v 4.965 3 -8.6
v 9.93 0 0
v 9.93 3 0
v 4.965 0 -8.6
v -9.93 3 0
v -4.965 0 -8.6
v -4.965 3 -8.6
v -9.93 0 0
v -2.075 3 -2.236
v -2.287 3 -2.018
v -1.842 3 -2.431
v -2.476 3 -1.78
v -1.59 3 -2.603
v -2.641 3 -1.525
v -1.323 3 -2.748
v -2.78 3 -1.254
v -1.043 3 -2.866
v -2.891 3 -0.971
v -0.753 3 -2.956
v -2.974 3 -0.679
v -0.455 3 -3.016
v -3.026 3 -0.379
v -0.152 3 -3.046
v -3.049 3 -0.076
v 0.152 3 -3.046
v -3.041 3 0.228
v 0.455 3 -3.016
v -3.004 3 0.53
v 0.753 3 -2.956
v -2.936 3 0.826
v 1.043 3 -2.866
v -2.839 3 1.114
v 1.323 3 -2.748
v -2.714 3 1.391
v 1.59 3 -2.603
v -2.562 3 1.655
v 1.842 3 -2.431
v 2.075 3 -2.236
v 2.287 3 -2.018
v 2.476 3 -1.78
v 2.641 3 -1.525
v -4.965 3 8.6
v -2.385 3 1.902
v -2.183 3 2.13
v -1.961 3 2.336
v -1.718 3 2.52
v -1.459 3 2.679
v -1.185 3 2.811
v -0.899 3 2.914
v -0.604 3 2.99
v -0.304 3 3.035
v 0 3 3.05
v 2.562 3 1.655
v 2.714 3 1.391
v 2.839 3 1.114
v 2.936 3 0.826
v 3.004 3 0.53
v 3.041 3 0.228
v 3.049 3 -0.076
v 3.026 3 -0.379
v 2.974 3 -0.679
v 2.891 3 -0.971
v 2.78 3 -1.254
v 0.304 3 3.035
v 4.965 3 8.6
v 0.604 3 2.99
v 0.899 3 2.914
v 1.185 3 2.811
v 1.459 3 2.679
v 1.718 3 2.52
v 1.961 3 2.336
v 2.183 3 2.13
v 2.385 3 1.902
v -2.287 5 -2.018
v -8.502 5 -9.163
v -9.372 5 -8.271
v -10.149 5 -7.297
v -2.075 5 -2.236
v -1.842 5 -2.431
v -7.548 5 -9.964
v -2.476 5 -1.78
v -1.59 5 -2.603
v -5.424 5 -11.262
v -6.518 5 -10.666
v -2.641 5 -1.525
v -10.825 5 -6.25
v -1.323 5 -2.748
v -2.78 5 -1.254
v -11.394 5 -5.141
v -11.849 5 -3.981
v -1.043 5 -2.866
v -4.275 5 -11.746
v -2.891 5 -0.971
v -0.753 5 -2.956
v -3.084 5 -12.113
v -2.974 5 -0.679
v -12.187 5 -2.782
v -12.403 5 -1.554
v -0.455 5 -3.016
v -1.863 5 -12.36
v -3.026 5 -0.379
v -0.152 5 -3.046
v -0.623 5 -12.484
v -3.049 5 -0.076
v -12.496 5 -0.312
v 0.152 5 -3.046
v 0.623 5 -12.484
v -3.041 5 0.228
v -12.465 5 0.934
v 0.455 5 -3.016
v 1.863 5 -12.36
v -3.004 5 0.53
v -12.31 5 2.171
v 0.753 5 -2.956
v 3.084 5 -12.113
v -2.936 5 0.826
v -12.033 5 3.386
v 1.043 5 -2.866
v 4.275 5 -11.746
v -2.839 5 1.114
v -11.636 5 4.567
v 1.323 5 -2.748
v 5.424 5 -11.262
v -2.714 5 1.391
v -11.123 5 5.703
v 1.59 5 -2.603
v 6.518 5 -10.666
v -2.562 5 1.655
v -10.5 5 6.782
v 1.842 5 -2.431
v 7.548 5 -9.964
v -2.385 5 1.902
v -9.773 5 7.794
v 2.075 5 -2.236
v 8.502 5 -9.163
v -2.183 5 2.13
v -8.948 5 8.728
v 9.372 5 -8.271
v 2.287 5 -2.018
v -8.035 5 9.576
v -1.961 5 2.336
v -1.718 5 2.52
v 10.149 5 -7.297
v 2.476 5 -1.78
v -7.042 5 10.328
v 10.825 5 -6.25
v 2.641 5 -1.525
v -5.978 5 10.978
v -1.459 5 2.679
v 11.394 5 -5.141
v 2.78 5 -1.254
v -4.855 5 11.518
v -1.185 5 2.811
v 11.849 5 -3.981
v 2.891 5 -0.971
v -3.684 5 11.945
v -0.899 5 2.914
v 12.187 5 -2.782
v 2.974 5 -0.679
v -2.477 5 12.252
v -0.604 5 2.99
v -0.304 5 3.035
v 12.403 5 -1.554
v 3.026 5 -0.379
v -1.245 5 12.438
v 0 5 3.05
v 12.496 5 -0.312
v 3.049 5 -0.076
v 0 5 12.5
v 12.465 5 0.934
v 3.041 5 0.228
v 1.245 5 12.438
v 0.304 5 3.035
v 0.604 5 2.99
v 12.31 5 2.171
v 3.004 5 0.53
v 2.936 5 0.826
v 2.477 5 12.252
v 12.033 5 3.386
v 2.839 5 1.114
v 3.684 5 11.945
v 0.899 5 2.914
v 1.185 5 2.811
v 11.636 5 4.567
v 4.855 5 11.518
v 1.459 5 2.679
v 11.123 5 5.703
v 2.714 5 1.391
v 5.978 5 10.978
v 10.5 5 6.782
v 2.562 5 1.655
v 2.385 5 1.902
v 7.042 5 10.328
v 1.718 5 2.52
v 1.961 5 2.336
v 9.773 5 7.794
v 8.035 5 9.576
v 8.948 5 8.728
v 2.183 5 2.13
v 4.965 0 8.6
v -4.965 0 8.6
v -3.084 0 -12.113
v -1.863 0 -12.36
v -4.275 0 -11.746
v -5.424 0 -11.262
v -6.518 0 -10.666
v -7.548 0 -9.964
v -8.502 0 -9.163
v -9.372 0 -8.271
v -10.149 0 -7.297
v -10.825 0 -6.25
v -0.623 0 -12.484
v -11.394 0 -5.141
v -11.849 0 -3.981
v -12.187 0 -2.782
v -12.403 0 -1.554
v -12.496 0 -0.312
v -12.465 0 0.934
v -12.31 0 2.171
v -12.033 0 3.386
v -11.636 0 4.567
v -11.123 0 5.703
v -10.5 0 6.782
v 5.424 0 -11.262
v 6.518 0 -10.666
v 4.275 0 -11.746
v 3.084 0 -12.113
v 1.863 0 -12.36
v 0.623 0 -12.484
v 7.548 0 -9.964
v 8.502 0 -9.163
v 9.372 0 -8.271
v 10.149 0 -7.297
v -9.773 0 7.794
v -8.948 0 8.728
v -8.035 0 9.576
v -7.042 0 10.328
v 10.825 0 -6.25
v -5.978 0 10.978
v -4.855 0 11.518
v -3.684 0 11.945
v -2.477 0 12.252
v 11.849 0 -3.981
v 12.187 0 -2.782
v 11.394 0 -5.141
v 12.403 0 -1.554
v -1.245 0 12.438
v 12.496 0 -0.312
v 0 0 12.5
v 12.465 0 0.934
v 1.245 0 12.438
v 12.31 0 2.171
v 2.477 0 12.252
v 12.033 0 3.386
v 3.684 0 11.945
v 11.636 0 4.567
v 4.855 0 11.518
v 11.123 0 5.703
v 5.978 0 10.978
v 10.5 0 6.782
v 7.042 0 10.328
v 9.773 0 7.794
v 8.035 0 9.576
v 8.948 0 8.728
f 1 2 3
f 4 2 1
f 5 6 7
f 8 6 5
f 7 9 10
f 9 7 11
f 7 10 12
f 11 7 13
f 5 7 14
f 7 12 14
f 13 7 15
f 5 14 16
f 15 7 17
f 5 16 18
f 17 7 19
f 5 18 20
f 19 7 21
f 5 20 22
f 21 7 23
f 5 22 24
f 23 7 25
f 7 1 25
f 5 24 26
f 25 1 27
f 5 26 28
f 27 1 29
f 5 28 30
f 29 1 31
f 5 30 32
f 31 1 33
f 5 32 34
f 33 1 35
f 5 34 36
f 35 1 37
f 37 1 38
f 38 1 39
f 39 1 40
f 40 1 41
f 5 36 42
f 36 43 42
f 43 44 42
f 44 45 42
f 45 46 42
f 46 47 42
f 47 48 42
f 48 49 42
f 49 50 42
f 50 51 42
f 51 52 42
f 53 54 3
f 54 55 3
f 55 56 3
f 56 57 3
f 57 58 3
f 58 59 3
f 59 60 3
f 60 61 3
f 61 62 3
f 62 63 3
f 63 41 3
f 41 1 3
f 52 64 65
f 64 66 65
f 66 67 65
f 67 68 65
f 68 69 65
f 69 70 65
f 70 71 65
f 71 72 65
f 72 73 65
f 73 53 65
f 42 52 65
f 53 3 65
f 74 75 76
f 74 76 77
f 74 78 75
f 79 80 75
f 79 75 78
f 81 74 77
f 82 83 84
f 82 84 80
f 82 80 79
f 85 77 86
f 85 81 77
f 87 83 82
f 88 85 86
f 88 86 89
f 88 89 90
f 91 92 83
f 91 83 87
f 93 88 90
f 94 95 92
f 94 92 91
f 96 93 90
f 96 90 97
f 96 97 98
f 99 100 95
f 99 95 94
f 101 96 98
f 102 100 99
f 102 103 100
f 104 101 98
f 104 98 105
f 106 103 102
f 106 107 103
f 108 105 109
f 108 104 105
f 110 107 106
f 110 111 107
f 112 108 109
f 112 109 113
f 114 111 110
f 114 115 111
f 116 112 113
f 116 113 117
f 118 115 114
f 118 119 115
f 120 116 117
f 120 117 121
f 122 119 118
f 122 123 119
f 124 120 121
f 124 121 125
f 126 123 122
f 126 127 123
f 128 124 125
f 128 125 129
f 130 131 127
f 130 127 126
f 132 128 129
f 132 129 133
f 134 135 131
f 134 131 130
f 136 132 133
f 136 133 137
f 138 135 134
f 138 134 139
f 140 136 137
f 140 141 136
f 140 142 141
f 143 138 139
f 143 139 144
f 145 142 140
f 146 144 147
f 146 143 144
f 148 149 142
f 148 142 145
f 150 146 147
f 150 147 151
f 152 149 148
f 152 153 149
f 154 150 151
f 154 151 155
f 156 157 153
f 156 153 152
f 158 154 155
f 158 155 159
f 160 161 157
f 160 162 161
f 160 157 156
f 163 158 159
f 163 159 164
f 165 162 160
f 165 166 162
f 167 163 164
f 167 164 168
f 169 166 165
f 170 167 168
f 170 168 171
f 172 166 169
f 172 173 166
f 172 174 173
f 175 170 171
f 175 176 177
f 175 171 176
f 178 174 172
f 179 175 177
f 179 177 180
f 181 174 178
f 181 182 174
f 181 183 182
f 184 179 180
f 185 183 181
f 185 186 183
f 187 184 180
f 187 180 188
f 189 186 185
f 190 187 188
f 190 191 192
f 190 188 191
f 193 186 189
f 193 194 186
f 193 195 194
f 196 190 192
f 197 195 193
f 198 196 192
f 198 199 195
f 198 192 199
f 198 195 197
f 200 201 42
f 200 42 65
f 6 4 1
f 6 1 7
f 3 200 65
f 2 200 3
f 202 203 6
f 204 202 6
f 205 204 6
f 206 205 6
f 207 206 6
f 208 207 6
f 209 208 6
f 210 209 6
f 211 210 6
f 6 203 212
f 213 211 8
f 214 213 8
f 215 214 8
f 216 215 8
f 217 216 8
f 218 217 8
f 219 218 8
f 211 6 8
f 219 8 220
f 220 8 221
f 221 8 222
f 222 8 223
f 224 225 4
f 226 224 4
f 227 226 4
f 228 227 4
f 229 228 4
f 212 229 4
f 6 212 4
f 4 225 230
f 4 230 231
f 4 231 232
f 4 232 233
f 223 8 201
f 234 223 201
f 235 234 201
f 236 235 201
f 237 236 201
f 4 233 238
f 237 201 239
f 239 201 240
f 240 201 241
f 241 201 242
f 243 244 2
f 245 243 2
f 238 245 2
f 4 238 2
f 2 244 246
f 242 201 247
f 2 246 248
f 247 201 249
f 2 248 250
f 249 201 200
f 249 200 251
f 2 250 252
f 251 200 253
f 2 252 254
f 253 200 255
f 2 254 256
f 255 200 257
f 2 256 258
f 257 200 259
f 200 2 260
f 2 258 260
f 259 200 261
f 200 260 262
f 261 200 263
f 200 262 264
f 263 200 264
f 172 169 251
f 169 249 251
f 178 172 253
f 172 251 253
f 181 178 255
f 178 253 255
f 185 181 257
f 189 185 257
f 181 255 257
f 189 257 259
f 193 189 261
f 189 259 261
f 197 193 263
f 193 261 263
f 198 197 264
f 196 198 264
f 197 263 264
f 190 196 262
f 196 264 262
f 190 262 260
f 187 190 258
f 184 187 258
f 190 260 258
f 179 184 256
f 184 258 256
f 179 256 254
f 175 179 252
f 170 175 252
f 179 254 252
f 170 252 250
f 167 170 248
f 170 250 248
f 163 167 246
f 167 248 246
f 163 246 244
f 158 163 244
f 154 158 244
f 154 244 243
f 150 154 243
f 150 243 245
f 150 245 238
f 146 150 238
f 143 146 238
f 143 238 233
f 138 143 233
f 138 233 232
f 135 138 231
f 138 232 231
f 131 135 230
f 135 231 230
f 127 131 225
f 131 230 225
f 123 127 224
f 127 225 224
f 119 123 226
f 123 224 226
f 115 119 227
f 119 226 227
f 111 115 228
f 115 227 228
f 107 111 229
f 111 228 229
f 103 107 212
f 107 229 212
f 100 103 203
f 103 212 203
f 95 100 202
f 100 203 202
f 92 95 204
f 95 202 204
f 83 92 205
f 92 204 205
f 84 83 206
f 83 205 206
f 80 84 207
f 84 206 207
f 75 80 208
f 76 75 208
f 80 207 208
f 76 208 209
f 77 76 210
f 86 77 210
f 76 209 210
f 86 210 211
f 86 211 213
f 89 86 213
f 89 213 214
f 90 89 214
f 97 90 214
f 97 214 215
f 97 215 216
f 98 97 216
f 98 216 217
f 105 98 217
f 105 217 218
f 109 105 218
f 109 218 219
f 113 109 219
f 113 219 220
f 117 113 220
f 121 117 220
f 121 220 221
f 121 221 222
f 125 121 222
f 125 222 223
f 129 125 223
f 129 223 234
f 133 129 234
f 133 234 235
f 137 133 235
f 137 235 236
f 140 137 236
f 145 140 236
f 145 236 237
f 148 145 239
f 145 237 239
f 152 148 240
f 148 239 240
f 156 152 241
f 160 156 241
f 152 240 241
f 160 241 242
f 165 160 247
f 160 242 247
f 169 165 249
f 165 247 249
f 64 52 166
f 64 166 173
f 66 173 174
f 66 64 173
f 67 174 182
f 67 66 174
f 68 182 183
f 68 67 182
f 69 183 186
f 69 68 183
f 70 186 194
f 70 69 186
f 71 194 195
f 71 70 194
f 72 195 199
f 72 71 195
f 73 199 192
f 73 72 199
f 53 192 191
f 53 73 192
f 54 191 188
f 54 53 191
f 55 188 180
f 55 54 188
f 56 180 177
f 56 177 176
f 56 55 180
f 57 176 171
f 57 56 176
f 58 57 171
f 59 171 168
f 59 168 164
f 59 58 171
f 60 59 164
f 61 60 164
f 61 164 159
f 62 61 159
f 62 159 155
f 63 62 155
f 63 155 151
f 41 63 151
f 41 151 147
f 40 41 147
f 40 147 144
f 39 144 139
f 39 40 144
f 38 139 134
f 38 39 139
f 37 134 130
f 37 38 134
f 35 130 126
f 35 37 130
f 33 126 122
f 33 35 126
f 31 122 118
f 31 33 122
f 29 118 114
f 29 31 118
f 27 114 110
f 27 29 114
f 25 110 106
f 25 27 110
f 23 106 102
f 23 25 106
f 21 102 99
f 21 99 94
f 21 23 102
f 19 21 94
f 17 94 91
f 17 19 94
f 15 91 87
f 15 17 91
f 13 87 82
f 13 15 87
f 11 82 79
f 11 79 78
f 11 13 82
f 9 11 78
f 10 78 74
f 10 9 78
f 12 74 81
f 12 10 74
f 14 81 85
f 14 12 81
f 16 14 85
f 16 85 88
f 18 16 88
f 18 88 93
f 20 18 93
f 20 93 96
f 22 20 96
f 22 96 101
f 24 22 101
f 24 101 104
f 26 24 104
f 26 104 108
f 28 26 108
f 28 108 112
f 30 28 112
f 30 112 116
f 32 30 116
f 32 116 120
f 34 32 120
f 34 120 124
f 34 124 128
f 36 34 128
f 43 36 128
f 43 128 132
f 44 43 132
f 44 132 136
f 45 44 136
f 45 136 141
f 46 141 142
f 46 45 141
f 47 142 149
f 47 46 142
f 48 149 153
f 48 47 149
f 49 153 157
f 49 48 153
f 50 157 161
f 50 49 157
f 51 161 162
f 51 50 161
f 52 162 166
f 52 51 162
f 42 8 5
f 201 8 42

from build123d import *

# Parameters (mm, degrees)
SKETCH1_R           = 12.5
BOSS_EXTRUDE1_DEPTH = 3
SKETCH2_R           = 12.5
SKETCH2_R_2         = 3.05
BOSS_EXTRUDE2_DEPTH = 2


with BuildPart() as part:
    # Sketch1 → Boss-Extrude1 (new body)
    with BuildSketch(Plane(origin=(0, 0, 0), x_dir=(1, 0, 0), z_dir=(0, 1, 0))):
        with Locations(Location((0, 0, 0), (0, 0, 270))):
            Circle(SKETCH1_R)
        Polygon((9.93042463, 0), (4.965212315, 8.6), (-4.965212315, 8.6), (-9.93042463, 0), (-4.965212315, -8.6), (4.965212315, -8.6), align=None, mode=Mode.SUBTRACT)
    extrude(amount=BOSS_EXTRUDE1_DEPTH)

    # Sketch2 → Boss-Extrude2 (add)
    with BuildSketch(Plane(origin=(0, 3, 0), x_dir=(1, 0, 0), z_dir=(0, 1, 0))):
        with Locations(Location((0, 0, 0), (0, 0, 270))):
            Circle(SKETCH2_R)
        with Locations(Location((0, 0, 0), (0, 0, 270))):
            Circle(SKETCH2_R_2, mode=Mode.SUBTRACT)
    extrude(amount=BOSS_EXTRUDE2_DEPTH)


solid = part.part
